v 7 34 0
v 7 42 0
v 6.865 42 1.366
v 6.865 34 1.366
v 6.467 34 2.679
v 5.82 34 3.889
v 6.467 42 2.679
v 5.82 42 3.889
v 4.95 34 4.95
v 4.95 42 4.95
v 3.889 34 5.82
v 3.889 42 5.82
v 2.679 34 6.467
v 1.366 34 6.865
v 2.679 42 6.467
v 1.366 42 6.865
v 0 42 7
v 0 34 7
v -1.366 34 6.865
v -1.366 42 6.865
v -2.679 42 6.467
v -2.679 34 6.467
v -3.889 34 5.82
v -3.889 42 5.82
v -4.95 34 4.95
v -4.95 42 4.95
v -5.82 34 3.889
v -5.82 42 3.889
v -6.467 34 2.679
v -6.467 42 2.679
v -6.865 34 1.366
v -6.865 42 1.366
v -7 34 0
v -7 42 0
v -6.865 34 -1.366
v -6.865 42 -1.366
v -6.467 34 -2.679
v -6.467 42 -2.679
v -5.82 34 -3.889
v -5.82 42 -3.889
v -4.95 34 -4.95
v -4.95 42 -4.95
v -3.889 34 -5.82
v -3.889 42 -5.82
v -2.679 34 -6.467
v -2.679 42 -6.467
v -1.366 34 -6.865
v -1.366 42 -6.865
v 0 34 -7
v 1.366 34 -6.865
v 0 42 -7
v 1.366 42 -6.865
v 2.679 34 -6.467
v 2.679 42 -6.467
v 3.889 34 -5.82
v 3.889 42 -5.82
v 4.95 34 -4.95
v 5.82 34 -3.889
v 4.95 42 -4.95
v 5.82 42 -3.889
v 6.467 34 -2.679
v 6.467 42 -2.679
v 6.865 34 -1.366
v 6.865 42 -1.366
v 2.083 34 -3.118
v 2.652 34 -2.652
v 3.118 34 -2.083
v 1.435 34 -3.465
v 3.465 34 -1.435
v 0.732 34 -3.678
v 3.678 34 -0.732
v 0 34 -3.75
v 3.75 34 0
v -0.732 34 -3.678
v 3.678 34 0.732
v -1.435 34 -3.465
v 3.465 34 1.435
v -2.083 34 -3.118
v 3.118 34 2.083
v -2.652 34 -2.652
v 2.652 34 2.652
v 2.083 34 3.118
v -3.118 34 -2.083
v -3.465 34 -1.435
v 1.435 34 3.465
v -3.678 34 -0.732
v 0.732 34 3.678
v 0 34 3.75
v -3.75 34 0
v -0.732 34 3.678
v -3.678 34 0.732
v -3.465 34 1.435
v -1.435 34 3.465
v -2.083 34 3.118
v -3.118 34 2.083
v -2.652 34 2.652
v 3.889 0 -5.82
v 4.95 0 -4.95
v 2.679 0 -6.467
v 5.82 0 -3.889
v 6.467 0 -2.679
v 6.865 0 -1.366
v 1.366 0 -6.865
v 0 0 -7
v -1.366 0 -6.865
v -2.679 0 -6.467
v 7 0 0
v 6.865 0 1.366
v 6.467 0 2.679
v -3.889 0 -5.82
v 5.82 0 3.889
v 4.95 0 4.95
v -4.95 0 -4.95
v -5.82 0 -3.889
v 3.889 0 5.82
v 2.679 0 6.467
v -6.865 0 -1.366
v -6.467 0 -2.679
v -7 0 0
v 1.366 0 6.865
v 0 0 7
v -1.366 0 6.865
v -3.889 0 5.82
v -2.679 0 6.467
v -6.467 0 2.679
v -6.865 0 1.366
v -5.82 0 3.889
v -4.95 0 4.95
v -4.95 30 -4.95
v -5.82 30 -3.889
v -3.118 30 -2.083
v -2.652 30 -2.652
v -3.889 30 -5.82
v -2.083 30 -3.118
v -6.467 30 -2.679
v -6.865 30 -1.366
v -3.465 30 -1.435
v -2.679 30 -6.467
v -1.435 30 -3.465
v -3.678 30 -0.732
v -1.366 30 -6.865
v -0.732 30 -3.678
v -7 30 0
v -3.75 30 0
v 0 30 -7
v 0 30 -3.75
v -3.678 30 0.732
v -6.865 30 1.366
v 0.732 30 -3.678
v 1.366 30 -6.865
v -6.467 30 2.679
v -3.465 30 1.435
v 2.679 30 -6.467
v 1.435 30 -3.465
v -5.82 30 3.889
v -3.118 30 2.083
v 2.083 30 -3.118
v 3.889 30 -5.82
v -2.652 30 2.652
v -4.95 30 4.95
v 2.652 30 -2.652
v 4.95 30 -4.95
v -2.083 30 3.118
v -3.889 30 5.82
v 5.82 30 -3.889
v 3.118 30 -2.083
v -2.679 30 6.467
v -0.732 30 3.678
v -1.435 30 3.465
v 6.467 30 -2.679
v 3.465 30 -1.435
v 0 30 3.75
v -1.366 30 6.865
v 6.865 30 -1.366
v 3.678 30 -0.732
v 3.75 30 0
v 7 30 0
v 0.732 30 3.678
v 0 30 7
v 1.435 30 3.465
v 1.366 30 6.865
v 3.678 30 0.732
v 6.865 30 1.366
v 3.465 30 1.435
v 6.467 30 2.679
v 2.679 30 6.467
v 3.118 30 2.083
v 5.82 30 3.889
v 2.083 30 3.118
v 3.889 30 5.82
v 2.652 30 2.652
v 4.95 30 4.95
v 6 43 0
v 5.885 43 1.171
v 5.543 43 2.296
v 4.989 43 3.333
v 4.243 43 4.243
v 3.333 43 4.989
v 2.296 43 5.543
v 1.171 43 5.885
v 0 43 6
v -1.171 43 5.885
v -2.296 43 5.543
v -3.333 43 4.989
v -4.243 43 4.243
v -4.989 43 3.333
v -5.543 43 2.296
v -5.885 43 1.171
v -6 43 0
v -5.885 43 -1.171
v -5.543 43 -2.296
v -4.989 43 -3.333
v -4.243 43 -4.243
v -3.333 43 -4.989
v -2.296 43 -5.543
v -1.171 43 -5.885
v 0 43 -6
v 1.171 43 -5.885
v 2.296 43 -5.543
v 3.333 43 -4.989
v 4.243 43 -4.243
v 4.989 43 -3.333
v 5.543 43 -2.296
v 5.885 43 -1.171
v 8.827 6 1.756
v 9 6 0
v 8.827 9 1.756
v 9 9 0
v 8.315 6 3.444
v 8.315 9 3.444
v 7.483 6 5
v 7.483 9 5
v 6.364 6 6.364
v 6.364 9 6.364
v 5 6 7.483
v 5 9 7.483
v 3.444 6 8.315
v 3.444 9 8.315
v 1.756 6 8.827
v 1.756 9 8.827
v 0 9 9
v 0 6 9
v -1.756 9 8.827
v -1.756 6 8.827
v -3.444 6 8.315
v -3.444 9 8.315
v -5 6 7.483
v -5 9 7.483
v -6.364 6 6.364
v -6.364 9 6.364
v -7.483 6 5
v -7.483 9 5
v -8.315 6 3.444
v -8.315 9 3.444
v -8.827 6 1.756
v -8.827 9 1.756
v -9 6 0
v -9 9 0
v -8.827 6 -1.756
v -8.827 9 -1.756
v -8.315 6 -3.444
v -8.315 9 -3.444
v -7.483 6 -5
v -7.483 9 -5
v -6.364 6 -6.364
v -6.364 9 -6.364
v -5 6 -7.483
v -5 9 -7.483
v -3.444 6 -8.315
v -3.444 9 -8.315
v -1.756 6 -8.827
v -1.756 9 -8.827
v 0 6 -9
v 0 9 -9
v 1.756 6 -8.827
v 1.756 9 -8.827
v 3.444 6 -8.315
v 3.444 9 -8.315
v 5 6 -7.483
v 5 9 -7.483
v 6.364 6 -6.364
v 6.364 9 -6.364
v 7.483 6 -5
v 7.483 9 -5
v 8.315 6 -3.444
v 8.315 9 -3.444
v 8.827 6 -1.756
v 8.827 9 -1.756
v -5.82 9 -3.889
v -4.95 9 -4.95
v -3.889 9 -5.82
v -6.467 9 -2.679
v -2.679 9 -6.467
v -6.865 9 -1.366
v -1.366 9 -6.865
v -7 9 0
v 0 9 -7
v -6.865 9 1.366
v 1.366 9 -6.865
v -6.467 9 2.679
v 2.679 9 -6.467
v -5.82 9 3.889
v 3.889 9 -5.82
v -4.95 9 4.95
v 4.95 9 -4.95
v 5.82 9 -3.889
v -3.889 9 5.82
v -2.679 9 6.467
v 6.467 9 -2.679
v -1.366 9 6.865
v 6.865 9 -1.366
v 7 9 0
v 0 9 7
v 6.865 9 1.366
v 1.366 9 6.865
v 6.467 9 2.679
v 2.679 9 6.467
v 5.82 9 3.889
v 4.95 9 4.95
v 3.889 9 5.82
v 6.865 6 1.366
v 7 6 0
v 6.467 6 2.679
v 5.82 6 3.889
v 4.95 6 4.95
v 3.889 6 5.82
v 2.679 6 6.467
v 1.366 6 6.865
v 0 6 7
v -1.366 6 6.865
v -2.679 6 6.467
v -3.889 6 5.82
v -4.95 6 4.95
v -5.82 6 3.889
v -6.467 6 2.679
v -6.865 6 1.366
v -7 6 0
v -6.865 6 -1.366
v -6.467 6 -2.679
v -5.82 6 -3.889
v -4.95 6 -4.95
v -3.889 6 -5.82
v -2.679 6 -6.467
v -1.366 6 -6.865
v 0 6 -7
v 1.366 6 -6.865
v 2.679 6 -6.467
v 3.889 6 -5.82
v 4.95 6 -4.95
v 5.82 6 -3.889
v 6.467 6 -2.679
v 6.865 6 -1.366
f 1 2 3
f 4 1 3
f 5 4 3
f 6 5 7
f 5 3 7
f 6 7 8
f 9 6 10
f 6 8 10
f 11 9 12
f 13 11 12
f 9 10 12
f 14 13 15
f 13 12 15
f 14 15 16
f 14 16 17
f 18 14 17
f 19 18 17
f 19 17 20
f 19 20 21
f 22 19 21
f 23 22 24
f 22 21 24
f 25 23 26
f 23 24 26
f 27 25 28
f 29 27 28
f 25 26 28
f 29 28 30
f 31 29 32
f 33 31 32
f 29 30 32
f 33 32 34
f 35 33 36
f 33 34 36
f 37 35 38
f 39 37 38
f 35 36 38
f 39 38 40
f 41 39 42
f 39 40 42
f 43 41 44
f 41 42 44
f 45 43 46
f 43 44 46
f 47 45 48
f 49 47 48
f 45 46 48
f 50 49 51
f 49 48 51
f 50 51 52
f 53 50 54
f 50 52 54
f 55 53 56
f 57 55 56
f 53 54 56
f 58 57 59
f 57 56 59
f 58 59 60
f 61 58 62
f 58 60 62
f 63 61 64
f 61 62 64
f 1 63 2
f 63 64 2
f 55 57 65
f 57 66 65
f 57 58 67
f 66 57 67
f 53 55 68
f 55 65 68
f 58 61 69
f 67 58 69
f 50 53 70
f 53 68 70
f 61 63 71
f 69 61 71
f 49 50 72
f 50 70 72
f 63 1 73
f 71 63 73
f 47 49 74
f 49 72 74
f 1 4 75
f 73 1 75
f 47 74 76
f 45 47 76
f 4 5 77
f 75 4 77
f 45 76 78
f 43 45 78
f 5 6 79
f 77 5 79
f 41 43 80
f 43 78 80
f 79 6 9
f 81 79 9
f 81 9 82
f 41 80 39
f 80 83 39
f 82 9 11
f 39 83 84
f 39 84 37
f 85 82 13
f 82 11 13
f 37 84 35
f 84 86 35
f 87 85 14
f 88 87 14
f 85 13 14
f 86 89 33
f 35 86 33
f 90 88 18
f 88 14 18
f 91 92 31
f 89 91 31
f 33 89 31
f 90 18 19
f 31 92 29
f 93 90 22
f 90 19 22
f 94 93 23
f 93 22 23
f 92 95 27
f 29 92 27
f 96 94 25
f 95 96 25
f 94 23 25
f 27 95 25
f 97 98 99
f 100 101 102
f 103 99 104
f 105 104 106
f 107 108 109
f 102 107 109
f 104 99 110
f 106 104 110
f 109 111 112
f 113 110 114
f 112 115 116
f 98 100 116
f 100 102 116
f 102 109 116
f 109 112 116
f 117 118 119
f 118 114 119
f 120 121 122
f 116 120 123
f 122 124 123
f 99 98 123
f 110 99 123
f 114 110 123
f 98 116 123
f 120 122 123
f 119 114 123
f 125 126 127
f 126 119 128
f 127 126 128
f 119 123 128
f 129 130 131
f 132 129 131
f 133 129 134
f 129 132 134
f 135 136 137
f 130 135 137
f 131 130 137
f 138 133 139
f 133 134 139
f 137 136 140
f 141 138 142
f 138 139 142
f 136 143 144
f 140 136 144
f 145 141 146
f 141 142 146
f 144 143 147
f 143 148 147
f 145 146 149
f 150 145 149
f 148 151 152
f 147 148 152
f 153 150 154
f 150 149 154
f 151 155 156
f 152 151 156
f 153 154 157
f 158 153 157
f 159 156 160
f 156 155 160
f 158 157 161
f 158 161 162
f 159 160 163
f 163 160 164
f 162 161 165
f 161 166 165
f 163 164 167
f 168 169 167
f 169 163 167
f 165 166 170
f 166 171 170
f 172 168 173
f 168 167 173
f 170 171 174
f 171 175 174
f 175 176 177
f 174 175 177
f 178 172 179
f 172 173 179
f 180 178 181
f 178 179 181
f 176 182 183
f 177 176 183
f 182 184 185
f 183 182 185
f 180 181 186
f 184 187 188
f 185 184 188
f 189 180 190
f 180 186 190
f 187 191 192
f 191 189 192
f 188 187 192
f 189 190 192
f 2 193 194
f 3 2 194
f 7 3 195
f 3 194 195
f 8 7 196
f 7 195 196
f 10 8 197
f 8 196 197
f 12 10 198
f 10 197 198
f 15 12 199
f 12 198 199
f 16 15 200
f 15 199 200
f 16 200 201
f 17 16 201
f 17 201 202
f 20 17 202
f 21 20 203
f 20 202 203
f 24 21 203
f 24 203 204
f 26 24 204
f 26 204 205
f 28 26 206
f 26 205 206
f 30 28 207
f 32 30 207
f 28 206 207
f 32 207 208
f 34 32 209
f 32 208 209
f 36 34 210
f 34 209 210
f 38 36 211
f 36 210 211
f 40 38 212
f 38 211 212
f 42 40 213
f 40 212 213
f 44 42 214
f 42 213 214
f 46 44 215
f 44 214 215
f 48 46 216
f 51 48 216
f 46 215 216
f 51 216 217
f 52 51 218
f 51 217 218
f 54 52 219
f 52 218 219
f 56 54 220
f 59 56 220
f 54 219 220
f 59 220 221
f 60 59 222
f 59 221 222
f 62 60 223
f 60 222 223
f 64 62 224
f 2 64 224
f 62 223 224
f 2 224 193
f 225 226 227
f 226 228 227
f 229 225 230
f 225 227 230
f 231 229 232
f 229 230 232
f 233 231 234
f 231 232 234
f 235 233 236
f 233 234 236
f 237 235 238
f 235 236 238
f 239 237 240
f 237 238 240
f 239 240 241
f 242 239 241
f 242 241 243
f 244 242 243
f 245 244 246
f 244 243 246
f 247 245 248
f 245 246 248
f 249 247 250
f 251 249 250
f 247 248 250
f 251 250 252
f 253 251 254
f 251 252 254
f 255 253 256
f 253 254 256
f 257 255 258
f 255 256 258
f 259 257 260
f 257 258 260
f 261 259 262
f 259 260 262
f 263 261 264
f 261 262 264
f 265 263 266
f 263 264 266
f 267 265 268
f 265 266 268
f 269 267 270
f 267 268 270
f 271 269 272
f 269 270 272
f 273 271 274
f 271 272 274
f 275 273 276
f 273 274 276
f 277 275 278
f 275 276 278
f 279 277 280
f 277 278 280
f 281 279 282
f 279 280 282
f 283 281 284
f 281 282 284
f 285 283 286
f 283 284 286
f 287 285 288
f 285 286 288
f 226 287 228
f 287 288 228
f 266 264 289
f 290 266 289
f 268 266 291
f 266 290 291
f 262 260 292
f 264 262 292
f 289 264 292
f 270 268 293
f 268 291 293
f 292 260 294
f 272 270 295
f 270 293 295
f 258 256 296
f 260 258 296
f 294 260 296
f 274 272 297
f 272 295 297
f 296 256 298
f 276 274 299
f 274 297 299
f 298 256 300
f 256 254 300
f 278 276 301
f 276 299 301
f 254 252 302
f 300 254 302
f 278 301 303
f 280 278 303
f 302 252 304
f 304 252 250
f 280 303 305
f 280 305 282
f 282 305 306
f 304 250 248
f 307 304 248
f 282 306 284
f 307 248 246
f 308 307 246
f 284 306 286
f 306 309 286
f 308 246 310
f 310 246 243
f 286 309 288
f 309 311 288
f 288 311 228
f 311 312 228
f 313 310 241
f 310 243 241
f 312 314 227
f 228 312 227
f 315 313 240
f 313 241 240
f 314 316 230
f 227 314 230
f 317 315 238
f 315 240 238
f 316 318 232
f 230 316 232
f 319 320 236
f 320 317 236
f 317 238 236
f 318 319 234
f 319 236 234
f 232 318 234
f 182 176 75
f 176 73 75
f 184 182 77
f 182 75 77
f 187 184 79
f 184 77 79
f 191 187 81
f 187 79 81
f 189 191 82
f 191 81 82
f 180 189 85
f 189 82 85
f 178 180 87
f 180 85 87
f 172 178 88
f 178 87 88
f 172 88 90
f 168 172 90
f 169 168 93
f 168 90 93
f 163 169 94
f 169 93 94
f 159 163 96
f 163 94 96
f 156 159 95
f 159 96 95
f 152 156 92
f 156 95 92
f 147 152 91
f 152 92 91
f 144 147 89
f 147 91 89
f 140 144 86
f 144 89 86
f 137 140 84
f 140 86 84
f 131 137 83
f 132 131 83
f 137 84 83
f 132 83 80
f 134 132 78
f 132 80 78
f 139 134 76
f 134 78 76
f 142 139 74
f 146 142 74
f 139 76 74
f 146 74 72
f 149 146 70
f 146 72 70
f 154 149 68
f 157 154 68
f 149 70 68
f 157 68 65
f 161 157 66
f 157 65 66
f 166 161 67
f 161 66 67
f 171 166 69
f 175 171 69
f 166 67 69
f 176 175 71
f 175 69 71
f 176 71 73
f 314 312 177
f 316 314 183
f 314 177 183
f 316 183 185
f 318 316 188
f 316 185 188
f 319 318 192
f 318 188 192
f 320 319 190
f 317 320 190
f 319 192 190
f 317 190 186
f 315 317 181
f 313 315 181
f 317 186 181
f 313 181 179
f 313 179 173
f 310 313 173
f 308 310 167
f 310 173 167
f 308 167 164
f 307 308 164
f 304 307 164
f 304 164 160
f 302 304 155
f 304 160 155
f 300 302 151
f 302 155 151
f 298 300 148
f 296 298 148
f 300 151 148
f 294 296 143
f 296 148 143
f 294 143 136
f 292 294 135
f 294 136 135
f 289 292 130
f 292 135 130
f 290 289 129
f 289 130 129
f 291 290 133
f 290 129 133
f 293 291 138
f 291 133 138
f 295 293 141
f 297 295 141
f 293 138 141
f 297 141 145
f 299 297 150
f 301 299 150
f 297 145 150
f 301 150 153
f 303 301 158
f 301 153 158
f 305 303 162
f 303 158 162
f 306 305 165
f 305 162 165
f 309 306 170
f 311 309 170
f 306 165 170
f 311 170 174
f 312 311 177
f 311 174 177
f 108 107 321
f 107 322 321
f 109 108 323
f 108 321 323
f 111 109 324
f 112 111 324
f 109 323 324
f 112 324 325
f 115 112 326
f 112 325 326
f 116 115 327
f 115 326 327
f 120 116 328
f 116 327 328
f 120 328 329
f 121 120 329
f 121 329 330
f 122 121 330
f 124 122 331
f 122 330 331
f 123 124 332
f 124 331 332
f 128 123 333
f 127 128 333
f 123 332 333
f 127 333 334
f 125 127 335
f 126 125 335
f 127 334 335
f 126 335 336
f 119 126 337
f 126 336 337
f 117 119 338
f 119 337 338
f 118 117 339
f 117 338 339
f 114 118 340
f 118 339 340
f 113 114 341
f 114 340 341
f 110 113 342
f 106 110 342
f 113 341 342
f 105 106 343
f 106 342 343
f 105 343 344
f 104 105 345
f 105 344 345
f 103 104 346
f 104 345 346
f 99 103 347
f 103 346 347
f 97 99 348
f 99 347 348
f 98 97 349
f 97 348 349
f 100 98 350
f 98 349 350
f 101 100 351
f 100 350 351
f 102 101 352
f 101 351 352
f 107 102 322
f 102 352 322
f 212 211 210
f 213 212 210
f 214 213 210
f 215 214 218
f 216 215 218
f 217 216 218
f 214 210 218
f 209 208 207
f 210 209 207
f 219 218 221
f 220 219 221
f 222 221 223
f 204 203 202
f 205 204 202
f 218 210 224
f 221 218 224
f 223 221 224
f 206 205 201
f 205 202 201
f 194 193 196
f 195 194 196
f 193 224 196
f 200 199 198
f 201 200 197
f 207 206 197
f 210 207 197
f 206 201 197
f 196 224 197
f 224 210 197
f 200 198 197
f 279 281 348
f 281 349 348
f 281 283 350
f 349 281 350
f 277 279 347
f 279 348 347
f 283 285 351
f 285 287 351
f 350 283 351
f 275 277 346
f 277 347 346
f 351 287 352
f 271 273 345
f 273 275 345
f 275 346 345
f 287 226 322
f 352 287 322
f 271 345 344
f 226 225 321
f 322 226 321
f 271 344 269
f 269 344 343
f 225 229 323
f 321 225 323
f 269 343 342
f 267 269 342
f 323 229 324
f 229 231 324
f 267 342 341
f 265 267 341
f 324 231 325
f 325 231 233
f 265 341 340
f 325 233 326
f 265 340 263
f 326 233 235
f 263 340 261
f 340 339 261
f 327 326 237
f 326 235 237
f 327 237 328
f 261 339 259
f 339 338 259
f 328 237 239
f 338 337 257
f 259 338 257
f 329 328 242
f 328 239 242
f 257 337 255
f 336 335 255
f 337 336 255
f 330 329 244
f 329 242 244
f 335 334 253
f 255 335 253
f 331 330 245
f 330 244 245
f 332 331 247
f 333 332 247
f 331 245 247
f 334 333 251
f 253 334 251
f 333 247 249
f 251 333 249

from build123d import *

# Parameters (mm, degrees)
CHAMFER1_SIZE = 1


with BuildPart() as part:
    # Sketch1 → Revolve1 (revolve)
    with BuildSketch(Plane.XY):
        Polygon((0, 0), (7, 0), (7, 6), (9, 6), (9, 9), (7, 9), (7, 30), (3.75, 30), (3.75, 34), (7, 34), (7, 43), (0, 43), align=None)
    revolve(axis=Axis((0, 43, 0), (0, -1, 0)))

    # Chamfer1
    chamfer1_edges = [part.edges().sort_by_distance(p)[0] for p in [
        (-7, 43, 0),
    ]]
    chamfer(chamfer1_edges, length=CHAMFER1_SIZE)


solid = part.part
